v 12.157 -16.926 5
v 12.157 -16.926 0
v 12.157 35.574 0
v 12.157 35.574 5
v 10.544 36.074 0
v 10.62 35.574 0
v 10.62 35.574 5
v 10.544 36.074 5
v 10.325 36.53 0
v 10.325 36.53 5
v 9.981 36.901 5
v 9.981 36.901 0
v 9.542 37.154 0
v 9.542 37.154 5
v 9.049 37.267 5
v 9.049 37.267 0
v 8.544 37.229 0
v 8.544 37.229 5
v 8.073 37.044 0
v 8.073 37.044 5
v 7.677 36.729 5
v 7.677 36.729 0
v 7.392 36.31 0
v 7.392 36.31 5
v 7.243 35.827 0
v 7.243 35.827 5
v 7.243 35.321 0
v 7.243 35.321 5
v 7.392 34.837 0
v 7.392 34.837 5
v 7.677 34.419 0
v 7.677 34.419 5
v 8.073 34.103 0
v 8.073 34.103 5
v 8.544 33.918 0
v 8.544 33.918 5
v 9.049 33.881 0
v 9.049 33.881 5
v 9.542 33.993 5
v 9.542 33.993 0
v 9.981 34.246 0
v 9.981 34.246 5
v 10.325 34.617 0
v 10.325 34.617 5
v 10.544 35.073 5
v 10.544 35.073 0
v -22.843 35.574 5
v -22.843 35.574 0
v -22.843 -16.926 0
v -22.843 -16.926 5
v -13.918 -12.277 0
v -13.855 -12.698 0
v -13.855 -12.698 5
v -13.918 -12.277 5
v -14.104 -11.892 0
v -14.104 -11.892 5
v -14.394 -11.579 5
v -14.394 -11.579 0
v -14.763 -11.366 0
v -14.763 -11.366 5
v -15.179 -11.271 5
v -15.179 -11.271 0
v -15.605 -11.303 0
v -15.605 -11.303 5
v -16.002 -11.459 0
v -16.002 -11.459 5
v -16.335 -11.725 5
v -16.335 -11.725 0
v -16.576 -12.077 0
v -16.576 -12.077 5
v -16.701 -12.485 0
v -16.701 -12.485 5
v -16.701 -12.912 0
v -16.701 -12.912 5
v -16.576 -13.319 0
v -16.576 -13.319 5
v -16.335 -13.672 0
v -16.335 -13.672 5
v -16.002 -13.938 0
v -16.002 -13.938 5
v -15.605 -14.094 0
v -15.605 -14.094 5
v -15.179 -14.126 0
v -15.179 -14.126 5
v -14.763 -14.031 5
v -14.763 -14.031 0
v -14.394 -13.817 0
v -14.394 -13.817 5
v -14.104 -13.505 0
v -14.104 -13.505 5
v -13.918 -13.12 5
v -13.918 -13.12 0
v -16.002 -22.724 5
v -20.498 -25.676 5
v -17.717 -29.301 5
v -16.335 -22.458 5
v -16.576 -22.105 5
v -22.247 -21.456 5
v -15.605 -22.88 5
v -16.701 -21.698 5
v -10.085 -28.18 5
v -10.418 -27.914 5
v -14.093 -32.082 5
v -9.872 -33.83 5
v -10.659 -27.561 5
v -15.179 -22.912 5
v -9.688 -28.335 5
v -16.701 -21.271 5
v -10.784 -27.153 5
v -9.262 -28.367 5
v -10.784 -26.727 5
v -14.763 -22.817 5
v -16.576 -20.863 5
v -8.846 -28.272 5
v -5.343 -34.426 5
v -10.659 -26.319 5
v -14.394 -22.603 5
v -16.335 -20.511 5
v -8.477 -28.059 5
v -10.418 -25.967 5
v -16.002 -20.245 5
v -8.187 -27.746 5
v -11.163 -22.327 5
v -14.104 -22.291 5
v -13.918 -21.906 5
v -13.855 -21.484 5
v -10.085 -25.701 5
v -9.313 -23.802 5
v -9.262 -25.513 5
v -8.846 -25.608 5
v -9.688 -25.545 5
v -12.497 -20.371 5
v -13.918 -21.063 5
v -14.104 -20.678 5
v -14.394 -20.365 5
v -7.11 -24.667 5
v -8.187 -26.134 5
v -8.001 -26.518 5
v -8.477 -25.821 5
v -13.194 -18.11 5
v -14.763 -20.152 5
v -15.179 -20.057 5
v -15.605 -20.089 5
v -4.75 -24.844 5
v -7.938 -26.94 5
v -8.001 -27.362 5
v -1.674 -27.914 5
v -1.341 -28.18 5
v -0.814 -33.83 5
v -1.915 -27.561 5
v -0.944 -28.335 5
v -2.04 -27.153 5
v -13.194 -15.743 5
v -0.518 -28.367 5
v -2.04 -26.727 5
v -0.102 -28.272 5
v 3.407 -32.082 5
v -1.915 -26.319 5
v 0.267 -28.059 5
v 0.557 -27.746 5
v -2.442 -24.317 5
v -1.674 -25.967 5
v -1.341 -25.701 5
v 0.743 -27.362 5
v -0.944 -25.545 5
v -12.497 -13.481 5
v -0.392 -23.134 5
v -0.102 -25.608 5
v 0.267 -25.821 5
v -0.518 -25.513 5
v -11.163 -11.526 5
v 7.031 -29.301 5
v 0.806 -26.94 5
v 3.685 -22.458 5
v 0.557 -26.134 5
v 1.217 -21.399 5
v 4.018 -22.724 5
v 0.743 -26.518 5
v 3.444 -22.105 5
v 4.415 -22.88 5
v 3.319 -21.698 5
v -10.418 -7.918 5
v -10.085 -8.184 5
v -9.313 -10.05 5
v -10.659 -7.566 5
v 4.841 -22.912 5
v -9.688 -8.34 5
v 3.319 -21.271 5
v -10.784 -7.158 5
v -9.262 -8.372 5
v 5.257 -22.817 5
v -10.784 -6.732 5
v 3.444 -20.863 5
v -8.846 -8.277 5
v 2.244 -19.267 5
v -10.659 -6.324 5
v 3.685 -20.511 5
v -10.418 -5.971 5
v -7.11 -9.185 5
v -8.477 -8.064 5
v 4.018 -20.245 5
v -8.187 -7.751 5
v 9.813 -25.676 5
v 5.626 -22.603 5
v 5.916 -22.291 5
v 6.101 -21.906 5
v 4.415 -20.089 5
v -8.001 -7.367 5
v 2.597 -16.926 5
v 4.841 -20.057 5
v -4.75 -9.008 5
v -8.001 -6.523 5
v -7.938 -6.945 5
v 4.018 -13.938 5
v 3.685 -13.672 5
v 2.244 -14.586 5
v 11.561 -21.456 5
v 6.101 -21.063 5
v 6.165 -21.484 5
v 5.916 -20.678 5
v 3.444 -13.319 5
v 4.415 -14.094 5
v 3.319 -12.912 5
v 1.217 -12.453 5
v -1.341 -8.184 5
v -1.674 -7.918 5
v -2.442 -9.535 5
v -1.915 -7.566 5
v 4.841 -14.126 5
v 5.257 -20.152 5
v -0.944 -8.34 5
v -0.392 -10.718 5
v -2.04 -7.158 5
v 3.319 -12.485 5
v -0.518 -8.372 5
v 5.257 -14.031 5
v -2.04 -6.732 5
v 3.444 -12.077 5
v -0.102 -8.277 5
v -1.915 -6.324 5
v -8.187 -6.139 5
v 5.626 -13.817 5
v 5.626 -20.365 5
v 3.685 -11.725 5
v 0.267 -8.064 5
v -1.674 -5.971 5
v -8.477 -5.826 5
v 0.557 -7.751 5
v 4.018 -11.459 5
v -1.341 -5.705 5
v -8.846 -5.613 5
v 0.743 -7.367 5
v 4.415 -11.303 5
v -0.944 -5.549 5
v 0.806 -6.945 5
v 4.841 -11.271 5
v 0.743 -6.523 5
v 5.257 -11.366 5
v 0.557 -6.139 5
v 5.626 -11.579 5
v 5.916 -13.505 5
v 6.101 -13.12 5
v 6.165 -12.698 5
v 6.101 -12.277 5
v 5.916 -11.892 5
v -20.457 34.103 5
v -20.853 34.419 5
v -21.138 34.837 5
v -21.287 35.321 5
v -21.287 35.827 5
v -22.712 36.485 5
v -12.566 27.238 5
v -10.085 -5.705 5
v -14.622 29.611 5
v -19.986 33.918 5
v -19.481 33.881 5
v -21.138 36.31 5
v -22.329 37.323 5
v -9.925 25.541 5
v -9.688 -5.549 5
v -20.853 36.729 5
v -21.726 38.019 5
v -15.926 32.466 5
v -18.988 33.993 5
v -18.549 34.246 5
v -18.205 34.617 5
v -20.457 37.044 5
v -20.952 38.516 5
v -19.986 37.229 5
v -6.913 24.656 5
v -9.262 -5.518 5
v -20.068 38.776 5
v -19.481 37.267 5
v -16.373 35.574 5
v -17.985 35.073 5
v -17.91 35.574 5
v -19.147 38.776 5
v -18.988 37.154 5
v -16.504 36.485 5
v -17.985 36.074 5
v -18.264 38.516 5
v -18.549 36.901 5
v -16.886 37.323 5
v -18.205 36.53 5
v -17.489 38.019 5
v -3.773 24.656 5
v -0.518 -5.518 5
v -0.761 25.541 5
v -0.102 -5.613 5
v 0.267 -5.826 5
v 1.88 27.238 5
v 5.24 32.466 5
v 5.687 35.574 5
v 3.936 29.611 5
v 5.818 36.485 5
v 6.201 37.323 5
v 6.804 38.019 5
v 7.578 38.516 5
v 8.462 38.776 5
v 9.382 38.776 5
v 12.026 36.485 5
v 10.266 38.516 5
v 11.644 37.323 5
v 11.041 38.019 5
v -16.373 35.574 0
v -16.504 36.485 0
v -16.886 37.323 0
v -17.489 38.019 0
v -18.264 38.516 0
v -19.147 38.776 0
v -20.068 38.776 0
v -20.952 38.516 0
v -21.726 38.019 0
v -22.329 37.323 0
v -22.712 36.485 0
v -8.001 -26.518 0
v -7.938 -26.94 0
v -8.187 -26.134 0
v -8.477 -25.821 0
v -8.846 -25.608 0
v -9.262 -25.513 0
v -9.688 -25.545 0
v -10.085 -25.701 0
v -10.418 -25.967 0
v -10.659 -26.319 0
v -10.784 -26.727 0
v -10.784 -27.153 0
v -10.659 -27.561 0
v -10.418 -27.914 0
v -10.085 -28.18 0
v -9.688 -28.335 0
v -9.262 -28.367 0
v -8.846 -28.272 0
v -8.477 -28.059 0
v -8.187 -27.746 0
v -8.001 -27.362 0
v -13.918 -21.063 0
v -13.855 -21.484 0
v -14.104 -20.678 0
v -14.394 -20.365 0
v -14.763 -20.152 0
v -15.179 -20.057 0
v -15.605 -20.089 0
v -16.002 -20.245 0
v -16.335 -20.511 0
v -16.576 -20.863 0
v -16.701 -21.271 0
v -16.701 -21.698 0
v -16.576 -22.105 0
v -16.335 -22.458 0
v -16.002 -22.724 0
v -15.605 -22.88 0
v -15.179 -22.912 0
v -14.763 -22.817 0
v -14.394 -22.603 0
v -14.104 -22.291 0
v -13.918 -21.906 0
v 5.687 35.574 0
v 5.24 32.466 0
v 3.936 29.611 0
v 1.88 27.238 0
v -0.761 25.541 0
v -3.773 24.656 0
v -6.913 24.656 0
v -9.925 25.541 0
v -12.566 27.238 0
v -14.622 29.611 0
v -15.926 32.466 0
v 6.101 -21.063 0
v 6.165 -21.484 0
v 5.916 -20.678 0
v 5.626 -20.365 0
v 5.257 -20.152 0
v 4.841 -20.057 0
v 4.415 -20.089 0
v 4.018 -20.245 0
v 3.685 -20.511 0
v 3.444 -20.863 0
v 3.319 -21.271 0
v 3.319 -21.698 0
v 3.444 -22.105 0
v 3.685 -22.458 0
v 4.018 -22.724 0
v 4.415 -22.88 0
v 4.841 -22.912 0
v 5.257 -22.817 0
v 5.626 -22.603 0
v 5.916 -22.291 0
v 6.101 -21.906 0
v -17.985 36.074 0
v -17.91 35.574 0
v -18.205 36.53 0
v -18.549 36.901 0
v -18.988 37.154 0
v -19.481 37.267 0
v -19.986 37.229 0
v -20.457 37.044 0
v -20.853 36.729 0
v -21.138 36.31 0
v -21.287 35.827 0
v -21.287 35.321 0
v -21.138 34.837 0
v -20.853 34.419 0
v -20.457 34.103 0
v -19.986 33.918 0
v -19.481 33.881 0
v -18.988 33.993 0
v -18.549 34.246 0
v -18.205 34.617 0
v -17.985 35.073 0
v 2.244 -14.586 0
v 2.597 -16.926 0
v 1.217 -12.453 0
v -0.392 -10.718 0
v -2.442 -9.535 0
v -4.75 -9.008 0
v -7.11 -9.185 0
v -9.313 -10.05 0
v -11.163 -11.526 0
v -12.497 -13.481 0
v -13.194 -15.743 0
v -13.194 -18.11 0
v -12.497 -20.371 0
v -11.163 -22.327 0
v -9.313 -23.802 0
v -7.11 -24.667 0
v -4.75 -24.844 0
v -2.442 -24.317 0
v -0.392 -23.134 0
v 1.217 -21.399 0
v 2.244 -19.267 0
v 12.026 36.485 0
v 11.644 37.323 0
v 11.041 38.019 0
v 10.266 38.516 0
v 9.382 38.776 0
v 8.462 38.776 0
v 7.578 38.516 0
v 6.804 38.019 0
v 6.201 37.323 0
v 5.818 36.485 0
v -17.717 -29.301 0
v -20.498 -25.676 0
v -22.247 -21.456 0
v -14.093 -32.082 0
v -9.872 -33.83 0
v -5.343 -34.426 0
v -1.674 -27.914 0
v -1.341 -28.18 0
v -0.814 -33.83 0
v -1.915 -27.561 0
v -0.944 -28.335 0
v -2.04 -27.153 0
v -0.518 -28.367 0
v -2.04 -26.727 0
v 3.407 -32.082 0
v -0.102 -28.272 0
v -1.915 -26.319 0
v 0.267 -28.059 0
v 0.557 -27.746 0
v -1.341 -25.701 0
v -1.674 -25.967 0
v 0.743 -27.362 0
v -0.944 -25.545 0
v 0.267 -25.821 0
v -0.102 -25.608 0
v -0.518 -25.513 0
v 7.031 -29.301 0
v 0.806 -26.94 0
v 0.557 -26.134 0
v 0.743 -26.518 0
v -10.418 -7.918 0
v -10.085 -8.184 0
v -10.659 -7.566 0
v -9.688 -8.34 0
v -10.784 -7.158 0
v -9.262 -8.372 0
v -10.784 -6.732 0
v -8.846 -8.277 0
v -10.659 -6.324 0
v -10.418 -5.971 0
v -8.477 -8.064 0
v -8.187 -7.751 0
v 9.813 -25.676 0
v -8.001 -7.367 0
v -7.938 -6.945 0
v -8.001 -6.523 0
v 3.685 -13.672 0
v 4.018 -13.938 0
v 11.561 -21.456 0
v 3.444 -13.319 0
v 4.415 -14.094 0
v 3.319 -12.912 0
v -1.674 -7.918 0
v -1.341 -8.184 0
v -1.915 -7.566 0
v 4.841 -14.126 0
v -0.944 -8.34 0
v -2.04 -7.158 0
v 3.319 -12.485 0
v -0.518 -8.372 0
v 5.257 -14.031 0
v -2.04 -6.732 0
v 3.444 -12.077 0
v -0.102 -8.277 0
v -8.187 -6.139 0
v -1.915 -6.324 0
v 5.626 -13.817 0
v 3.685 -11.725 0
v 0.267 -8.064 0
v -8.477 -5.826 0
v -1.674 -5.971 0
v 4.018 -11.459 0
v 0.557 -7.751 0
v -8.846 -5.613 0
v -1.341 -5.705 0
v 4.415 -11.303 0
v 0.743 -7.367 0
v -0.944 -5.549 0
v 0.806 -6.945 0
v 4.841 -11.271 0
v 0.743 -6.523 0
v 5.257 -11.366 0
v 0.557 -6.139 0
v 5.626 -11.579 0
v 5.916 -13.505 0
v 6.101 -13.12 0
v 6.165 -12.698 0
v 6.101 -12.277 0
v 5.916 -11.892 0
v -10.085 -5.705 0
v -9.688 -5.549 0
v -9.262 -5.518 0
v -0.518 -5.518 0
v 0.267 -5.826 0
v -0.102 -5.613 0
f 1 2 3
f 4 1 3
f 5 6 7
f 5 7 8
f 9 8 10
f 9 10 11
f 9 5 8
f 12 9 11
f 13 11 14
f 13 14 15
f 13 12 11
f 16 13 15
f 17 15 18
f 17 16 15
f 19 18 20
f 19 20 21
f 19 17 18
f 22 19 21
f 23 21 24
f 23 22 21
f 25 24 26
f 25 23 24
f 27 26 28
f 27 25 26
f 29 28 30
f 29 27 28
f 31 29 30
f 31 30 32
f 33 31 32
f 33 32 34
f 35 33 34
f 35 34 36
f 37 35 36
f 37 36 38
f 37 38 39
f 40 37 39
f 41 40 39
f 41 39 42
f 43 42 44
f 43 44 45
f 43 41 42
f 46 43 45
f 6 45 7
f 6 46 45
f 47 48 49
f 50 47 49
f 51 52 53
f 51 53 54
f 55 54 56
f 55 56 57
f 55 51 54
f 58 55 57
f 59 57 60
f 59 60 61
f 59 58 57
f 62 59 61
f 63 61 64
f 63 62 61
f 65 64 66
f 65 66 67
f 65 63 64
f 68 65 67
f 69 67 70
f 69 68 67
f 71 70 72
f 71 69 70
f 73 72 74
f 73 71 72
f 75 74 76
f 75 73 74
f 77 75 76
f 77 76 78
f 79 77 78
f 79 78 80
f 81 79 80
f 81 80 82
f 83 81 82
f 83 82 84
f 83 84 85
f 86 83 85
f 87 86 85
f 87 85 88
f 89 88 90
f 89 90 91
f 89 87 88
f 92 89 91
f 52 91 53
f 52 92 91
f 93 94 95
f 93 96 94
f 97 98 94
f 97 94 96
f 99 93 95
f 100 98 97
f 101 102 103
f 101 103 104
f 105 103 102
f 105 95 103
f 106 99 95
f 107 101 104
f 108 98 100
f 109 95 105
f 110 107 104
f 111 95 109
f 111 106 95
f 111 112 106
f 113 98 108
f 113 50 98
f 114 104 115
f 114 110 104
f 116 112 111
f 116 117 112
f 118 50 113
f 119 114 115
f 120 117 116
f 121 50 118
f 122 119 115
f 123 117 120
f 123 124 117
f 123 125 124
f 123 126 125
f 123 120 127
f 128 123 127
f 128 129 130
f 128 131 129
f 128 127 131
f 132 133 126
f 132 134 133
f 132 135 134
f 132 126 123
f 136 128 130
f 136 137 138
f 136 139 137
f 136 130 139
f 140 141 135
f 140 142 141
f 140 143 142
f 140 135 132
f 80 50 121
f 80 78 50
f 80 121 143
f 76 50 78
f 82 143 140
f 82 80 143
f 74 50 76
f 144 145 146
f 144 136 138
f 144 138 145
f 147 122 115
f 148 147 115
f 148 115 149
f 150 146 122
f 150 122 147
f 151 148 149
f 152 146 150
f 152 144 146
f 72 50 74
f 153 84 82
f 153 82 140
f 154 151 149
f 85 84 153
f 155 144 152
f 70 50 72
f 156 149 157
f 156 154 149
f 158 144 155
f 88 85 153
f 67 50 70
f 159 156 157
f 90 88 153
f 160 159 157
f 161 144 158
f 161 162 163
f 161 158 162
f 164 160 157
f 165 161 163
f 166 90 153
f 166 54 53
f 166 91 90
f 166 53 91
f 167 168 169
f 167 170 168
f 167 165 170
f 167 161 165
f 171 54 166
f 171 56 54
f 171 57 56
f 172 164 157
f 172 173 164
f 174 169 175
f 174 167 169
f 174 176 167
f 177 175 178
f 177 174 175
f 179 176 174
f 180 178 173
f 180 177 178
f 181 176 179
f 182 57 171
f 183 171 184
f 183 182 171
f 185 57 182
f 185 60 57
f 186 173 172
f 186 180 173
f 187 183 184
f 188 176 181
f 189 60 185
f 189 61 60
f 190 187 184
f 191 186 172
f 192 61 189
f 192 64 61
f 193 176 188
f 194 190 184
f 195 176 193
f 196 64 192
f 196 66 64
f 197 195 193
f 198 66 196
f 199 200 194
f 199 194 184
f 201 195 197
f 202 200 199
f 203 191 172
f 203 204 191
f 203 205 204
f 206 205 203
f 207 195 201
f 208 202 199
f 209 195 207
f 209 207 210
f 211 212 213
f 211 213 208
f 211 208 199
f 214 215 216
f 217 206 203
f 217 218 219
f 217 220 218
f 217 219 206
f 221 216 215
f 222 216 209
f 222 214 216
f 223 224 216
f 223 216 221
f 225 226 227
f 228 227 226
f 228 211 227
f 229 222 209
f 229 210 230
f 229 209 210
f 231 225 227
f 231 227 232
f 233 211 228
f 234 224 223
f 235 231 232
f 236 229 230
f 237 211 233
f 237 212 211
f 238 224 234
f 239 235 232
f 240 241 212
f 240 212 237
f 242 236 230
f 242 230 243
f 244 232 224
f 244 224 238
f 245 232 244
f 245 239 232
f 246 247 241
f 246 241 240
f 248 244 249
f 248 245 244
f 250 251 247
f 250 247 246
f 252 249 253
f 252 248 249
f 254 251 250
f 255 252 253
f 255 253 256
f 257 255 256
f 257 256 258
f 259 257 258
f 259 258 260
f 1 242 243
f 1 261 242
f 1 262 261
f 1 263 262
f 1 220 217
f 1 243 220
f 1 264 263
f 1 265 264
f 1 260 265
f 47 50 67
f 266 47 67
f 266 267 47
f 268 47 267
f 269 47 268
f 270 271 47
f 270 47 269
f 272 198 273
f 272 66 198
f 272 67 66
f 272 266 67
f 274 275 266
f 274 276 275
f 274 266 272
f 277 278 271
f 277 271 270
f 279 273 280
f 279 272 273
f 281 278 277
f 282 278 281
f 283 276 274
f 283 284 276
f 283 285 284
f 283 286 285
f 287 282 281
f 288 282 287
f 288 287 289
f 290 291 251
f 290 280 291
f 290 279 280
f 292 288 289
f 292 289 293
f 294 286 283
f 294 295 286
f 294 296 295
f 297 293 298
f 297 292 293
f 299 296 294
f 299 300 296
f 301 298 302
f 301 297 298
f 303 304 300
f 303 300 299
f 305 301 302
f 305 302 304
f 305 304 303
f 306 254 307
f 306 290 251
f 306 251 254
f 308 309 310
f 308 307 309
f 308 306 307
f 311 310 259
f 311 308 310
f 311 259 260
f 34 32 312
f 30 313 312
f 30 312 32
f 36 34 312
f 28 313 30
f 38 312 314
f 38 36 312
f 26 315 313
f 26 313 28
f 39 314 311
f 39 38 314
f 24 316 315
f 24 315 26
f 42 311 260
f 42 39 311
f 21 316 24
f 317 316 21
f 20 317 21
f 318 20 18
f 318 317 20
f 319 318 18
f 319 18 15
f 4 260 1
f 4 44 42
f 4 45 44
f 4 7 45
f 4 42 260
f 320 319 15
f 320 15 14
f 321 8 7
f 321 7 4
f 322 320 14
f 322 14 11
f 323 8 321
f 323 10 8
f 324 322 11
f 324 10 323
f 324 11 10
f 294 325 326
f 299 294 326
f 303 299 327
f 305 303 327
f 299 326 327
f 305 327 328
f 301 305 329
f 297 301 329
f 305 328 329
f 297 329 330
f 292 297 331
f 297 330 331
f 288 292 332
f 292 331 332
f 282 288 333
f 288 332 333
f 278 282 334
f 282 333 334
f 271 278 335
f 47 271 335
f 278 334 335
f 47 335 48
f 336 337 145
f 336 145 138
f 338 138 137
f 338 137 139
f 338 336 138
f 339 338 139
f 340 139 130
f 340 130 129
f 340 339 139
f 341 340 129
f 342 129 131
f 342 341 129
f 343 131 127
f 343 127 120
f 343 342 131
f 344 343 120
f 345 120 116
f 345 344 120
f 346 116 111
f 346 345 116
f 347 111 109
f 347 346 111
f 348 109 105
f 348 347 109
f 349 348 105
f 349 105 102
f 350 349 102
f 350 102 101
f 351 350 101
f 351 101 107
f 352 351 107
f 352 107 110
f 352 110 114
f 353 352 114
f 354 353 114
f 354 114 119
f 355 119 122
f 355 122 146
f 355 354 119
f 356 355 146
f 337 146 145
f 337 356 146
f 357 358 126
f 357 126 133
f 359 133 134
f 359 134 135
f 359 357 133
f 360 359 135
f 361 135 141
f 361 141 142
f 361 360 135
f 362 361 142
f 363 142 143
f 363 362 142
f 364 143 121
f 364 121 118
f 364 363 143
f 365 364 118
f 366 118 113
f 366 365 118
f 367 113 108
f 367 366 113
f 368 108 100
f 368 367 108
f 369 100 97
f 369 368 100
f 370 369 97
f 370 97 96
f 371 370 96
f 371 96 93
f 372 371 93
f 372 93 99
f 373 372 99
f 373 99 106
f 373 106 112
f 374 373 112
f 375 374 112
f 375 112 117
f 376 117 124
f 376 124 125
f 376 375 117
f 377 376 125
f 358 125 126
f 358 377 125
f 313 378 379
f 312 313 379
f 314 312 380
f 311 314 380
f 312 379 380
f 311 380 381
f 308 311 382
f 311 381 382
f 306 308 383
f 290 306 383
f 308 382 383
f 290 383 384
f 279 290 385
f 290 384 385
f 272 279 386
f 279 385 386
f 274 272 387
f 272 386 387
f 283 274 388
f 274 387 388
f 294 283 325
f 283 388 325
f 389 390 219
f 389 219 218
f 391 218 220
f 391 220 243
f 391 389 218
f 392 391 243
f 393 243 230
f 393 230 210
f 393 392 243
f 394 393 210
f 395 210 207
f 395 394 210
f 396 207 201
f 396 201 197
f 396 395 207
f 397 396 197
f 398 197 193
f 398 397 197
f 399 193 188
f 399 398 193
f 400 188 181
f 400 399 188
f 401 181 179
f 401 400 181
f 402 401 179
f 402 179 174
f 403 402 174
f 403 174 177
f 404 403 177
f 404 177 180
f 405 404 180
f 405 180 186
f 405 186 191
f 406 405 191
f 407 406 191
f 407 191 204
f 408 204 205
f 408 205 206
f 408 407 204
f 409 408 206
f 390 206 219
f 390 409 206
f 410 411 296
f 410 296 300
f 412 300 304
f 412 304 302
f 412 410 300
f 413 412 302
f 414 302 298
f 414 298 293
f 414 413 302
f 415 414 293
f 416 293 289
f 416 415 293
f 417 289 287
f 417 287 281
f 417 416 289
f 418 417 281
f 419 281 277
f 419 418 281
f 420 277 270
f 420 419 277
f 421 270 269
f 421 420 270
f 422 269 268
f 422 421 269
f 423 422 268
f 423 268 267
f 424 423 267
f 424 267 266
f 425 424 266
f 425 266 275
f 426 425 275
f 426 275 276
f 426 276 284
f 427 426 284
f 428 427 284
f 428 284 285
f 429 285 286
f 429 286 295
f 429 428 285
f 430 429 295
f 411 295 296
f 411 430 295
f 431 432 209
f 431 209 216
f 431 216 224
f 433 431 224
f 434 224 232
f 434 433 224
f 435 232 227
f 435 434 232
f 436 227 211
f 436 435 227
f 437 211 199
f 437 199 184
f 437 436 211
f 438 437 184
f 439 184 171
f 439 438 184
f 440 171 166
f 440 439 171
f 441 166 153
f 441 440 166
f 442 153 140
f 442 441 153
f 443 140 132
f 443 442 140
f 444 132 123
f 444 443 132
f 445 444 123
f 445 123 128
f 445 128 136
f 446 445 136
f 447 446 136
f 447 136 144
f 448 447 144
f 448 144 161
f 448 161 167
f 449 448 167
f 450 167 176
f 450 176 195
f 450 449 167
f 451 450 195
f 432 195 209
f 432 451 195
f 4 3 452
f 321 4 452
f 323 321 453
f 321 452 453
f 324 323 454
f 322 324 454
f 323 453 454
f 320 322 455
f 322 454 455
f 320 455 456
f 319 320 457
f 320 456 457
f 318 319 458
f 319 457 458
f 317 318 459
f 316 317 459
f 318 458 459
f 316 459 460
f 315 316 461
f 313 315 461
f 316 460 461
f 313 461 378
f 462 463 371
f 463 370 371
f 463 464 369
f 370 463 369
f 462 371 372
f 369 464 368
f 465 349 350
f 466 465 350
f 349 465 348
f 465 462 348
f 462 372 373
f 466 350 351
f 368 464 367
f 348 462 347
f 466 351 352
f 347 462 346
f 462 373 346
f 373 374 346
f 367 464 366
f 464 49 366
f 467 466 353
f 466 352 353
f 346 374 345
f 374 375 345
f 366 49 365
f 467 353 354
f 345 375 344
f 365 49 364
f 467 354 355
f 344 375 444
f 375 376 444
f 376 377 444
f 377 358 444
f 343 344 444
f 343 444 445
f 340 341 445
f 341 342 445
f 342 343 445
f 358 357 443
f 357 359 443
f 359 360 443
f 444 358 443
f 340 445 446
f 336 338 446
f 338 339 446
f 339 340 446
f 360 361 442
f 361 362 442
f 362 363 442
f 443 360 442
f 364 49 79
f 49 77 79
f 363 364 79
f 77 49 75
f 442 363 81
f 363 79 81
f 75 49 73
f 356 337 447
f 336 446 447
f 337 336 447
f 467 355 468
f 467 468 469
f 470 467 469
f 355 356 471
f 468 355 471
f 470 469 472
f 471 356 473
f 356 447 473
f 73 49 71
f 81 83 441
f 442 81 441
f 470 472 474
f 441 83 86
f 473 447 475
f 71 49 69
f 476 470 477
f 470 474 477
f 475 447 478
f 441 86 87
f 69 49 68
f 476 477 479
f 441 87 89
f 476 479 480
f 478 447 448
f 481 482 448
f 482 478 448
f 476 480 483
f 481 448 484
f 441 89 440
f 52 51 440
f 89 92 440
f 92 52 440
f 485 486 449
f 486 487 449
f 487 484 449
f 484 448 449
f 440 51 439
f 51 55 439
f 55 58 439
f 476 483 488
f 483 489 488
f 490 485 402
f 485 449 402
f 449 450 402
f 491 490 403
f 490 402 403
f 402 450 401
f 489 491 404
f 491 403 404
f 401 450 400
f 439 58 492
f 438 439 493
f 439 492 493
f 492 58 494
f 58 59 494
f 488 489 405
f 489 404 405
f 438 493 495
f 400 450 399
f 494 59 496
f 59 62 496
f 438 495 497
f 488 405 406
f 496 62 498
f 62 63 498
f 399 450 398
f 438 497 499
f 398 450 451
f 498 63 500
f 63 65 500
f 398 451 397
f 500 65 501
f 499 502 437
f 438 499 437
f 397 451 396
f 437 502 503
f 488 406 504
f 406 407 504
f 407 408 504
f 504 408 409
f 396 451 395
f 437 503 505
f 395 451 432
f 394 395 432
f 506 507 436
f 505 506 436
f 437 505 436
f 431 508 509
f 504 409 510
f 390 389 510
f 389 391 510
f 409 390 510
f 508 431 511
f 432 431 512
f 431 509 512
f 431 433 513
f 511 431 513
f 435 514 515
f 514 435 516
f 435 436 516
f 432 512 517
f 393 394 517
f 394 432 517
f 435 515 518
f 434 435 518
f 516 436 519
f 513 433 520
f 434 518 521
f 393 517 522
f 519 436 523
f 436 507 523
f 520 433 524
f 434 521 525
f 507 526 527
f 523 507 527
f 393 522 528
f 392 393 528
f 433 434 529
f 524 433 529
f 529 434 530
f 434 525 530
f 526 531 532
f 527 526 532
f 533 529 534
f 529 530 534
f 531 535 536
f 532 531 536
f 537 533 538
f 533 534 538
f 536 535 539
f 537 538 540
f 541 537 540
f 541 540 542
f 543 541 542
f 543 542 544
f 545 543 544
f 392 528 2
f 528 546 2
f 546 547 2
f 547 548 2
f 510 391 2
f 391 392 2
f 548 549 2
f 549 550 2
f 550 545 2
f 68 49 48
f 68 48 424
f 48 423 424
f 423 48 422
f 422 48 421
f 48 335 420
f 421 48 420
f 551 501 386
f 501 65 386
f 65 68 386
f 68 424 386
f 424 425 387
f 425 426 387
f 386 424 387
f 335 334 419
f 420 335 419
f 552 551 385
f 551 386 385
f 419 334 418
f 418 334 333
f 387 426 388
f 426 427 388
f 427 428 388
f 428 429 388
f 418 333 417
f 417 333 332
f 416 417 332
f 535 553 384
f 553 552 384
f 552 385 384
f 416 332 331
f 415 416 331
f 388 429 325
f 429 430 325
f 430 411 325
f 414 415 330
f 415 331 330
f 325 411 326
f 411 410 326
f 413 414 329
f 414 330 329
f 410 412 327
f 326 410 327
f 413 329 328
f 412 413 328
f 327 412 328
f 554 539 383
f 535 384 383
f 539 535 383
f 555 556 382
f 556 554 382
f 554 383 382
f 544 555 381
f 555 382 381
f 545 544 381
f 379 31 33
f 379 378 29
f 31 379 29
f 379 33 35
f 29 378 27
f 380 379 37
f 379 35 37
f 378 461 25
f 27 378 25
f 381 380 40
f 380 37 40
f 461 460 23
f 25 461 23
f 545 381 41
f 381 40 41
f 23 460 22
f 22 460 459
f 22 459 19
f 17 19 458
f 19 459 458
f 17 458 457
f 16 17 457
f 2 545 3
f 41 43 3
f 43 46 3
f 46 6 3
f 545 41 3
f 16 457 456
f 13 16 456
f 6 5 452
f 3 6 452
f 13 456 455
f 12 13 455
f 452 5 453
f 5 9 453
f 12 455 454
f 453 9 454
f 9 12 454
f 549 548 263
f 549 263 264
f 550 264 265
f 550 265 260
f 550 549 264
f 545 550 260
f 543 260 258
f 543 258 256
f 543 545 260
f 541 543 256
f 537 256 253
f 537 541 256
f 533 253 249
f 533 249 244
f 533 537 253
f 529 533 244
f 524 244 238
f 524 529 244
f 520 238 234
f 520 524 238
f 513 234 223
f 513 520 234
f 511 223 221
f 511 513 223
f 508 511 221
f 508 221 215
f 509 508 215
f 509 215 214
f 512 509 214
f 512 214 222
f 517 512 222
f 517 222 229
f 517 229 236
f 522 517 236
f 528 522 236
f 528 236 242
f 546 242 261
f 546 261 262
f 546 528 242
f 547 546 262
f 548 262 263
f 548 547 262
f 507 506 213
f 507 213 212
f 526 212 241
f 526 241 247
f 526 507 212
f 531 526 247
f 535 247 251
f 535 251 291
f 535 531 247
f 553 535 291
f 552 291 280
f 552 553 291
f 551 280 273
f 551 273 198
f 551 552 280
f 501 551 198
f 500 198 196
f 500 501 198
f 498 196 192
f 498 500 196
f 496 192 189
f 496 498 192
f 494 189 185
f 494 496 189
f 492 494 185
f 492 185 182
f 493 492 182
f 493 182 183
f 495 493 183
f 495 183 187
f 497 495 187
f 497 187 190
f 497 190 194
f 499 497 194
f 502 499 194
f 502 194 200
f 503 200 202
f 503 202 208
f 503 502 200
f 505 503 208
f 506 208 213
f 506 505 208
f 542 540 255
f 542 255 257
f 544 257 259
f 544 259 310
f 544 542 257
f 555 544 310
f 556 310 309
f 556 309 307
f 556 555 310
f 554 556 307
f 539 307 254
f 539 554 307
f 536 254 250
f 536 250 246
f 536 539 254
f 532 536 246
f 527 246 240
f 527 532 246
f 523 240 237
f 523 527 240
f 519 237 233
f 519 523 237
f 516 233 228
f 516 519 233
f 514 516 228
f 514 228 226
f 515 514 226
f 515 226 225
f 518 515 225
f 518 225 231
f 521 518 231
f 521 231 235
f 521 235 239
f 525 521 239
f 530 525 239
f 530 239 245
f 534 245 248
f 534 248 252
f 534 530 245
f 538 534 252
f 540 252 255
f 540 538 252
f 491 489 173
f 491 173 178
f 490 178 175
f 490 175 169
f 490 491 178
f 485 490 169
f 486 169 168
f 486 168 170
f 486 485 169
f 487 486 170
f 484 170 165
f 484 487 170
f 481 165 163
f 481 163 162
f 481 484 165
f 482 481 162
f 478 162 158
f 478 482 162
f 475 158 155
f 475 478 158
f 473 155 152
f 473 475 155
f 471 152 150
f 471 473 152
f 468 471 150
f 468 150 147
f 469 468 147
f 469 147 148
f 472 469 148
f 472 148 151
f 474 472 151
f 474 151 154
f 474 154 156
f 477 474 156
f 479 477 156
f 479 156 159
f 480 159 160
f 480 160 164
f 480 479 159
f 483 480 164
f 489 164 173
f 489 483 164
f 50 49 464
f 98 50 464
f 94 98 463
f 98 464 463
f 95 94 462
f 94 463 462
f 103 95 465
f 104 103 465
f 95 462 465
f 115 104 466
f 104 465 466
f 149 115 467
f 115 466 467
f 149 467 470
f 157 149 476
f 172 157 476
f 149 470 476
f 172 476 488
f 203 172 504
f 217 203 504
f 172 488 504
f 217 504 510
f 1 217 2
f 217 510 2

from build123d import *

# Parameters (mm, degrees)
SKETCH_1_R      = 7.94
SKETCH_1_R_2    = 1.697891057
SKETCH_1_R_3    = 1.431269813
EXTRUDE_1_DEPTH = 5


with BuildPart() as part:
    # 草图1 → 凸台-拉伸1 (new body)
    with BuildSketch(Plane.XY):
        with BuildLine():
            Line((-22.842936614, 35.573770492), (-22.842936614, -16.926229508))
            ThreePointArc((-22.842936614, -16.926229508), (-5.342936614, -34.426229508), (12.157063386, -16.926229508))
            Line((12.157063386, -16.926229508), (12.157063386, 35.573770492))
            ThreePointArc((12.157063386, 35.573770492), (8.922010957, 38.80882292), (5.686958528, 35.573770492))
            ThreePointArc((5.686958528, 35.573770492), (-5.342936614, 24.543875349), (-16.372831757, 35.573770492))
            ThreePointArc((-16.372831757, 35.573770492), (-19.607884186, 38.80882292), (-22.842936614, 35.573770492))
        make_face()
        with Locations((-5.342936614, -16.926229508)):
            Circle(SKETCH_1_R, mode=Mode.SUBTRACT)
        with Locations((-19.607884186, 35.573770492)):
            Circle(SKETCH_1_R_2, mode=Mode.SUBTRACT)
        with Locations((8.922010957, 35.573770492)):
            Circle(SKETCH_1_R_2, mode=Mode.SUBTRACT)
        with Locations((-9.369105652, -6.944867305)):
            Circle(SKETCH_1_R_3, mode=Mode.SUBTRACT)
        with Locations((-15.286101655, -12.698452236)):
            Circle(SKETCH_1_R_3, mode=Mode.SUBTRACT)
        with Locations((-0.625126274, -26.940078994)):
            Circle(SKETCH_1_R_3, mode=Mode.SUBTRACT)
        with Locations((-15.286101655, -21.484473196)):
            Circle(SKETCH_1_R_3, mode=Mode.SUBTRACT)
        with Locations((-9.369105652, -26.940078994)):
            Circle(SKETCH_1_R_3, mode=Mode.SUBTRACT)
        with Locations((-0.625126274, -6.944867305)):
            Circle(SKETCH_1_R_3, mode=Mode.SUBTRACT)
        with Locations((4.733813833, -12.698452236)):
            Circle(SKETCH_1_R_3, mode=Mode.SUBTRACT)
        with Locations((4.733813833, -21.484473196)):
            Circle(SKETCH_1_R_3, mode=Mode.SUBTRACT)
    extrude(amount=EXTRUDE_1_DEPTH)


solid = part.part
